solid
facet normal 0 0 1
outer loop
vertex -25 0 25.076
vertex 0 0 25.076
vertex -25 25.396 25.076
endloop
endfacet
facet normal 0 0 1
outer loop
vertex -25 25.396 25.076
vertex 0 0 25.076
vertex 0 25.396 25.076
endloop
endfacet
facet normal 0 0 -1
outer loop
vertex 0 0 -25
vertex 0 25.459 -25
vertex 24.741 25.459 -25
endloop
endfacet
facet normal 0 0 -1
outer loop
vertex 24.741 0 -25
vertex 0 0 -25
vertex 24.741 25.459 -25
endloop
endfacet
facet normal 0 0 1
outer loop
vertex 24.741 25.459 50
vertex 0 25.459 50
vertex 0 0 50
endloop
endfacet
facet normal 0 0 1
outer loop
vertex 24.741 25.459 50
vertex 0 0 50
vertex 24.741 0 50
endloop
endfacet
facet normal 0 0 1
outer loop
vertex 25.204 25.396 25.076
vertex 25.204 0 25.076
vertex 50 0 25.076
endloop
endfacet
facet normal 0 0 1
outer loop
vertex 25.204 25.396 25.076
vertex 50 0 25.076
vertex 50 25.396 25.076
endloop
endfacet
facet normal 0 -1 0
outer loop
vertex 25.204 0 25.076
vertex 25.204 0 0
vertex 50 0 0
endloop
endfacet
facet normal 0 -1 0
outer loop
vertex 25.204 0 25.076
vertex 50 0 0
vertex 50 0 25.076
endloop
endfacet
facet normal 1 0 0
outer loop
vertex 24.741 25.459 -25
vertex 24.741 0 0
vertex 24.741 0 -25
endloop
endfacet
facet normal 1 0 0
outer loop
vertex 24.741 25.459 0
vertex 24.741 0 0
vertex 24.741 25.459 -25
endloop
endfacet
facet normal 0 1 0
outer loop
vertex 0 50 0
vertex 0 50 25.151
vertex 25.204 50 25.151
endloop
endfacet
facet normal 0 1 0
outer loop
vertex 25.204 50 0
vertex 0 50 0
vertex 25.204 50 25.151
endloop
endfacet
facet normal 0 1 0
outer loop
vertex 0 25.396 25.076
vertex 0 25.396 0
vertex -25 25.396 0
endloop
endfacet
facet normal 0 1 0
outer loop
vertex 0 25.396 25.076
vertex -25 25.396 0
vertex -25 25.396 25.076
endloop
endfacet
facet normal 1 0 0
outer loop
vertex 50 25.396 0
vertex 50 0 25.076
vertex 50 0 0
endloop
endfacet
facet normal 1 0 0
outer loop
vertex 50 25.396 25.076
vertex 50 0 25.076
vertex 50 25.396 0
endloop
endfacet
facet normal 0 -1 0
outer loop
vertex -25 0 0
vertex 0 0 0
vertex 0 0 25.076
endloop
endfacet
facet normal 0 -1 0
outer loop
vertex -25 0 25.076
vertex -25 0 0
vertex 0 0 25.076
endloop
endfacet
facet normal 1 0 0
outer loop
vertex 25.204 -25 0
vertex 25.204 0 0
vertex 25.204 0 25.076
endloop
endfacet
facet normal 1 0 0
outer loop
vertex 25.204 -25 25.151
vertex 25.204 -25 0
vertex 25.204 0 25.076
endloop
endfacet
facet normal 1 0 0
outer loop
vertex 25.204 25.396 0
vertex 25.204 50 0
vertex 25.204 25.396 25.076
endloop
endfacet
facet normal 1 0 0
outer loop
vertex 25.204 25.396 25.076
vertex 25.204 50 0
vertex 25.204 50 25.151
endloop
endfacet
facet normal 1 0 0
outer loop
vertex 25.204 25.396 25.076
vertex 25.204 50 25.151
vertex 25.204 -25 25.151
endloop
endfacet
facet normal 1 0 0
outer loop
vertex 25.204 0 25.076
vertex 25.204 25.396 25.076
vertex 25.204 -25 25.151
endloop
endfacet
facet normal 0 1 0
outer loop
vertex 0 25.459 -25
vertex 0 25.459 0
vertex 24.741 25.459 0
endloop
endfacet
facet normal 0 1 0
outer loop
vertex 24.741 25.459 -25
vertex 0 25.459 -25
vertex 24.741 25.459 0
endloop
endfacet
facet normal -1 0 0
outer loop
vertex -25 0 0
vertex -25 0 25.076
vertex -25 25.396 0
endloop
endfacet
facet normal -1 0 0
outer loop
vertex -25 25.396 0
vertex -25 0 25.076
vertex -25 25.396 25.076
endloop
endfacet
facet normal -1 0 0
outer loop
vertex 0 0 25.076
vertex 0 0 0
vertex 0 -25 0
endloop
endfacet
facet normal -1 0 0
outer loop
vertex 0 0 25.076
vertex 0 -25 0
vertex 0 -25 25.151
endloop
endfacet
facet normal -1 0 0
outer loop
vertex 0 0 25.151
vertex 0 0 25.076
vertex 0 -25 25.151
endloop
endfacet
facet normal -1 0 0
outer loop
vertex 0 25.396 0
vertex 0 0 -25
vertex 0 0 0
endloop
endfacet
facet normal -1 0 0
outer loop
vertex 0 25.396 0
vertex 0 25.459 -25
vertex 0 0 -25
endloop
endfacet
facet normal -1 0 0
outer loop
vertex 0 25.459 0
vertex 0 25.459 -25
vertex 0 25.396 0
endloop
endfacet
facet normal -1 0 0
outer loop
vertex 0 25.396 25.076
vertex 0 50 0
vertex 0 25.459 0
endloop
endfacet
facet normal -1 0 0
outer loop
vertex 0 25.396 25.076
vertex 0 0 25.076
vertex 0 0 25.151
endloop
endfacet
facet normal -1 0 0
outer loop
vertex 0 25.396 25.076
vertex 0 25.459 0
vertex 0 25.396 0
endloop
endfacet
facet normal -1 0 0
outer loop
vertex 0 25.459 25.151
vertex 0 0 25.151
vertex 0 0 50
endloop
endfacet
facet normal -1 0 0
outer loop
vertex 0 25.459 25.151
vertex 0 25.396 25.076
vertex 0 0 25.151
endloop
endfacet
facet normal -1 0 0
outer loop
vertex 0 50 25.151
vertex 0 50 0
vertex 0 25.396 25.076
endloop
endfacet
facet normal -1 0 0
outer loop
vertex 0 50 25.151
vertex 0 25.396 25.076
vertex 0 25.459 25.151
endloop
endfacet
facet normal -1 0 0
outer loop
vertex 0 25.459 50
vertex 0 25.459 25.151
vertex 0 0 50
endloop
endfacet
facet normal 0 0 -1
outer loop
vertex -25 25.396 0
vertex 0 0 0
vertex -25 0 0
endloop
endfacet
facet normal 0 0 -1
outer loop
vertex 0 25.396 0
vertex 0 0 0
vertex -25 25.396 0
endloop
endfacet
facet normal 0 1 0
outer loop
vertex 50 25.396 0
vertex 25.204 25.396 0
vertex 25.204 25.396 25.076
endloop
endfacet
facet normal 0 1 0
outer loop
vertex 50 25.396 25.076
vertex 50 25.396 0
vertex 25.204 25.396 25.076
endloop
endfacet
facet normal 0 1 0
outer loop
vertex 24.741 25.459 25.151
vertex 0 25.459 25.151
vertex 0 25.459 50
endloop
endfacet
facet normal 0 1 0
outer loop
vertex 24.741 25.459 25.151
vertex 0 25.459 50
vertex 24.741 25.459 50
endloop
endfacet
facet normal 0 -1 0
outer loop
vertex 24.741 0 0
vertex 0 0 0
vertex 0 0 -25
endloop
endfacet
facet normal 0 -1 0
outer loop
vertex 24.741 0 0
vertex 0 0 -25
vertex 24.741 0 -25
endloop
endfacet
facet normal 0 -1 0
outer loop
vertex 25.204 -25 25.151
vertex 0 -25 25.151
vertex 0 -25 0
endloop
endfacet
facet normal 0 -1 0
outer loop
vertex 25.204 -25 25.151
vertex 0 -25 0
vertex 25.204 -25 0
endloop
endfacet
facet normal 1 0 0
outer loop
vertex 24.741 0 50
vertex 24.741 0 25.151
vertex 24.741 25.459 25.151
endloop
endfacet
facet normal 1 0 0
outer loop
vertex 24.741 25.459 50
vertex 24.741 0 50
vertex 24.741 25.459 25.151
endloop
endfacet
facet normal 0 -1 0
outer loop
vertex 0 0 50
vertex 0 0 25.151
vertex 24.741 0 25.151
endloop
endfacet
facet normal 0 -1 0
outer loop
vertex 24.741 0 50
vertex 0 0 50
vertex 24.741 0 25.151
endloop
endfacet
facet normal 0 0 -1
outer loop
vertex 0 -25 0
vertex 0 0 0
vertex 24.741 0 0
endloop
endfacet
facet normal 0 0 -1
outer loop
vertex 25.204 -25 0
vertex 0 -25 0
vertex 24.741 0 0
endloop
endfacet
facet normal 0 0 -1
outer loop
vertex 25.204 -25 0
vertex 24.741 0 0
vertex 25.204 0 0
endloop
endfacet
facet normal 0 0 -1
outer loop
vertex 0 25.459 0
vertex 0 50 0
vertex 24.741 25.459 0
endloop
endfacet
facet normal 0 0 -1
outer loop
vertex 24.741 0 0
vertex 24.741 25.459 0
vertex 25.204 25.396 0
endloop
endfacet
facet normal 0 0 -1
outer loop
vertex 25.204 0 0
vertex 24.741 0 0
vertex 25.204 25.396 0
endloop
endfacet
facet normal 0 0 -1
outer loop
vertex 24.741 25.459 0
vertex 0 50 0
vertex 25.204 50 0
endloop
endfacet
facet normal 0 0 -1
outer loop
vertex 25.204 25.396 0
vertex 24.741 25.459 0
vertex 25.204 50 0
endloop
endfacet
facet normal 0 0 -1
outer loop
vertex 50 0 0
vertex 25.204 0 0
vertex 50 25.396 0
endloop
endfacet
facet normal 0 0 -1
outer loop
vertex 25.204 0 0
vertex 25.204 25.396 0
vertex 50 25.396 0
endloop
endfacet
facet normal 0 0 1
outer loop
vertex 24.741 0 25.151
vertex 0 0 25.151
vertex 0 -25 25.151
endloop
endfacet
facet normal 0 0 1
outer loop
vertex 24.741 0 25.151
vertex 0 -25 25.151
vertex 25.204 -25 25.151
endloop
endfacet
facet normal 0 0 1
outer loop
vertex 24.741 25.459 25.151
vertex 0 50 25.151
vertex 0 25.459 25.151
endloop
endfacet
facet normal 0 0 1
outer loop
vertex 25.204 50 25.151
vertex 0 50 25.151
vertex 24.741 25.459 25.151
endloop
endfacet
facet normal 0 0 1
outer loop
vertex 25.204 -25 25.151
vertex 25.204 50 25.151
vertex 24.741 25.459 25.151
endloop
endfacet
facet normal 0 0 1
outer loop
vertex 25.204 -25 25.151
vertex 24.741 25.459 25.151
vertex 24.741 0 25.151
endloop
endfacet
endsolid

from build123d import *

# Parameters (mm, degrees)
F0_W          = 25.2043232322
F0_H          = 25.1512657851
F1_DEPTH      = 50
F1_DEPTH_BACK = 25
F2_W          = 24.7411523014
F2_H          = 25.458579883
F3_DEPTH      = 25
F3_DEPTH_BACK = 50
F4_W          = 25.3962129354
F4_H          = 25.0760298222
F5_DEPTH      = 25
F5_DEPTH_BACK = 50


with BuildPart() as f1:
    # F0 (on Front) → F1 (new body, two sides)
    with BuildSketch(Plane.XZ) as f1_sk:
        with Locations((12.6021616161, 12.5756328925)):
            Rectangle(F0_W, F0_H)
    extrude(amount=-F1_DEPTH)
    extrude(f1_sk.sketch, amount=F1_DEPTH_BACK)

    # F2 (on Top) → F3 (join, two sides)
    with BuildSketch(Plane.XY) as f3_sk:
        with Locations((12.3705761507, 12.7292899415)):
            Rectangle(F2_W, F2_H)
    extrude(amount=-F3_DEPTH)
    extrude(f3_sk.sketch, amount=F3_DEPTH_BACK)

    # F4 (on Right) → F5 (join, two sides)
    with BuildSketch(Plane.YZ) as f5_sk:
        with Locations((12.6981064677, 12.5380149111)):
            Rectangle(F4_W, F4_H)
    extrude(amount=-F5_DEPTH)
    extrude(f5_sk.sketch, amount=F5_DEPTH_BACK)


solid = f1.part
